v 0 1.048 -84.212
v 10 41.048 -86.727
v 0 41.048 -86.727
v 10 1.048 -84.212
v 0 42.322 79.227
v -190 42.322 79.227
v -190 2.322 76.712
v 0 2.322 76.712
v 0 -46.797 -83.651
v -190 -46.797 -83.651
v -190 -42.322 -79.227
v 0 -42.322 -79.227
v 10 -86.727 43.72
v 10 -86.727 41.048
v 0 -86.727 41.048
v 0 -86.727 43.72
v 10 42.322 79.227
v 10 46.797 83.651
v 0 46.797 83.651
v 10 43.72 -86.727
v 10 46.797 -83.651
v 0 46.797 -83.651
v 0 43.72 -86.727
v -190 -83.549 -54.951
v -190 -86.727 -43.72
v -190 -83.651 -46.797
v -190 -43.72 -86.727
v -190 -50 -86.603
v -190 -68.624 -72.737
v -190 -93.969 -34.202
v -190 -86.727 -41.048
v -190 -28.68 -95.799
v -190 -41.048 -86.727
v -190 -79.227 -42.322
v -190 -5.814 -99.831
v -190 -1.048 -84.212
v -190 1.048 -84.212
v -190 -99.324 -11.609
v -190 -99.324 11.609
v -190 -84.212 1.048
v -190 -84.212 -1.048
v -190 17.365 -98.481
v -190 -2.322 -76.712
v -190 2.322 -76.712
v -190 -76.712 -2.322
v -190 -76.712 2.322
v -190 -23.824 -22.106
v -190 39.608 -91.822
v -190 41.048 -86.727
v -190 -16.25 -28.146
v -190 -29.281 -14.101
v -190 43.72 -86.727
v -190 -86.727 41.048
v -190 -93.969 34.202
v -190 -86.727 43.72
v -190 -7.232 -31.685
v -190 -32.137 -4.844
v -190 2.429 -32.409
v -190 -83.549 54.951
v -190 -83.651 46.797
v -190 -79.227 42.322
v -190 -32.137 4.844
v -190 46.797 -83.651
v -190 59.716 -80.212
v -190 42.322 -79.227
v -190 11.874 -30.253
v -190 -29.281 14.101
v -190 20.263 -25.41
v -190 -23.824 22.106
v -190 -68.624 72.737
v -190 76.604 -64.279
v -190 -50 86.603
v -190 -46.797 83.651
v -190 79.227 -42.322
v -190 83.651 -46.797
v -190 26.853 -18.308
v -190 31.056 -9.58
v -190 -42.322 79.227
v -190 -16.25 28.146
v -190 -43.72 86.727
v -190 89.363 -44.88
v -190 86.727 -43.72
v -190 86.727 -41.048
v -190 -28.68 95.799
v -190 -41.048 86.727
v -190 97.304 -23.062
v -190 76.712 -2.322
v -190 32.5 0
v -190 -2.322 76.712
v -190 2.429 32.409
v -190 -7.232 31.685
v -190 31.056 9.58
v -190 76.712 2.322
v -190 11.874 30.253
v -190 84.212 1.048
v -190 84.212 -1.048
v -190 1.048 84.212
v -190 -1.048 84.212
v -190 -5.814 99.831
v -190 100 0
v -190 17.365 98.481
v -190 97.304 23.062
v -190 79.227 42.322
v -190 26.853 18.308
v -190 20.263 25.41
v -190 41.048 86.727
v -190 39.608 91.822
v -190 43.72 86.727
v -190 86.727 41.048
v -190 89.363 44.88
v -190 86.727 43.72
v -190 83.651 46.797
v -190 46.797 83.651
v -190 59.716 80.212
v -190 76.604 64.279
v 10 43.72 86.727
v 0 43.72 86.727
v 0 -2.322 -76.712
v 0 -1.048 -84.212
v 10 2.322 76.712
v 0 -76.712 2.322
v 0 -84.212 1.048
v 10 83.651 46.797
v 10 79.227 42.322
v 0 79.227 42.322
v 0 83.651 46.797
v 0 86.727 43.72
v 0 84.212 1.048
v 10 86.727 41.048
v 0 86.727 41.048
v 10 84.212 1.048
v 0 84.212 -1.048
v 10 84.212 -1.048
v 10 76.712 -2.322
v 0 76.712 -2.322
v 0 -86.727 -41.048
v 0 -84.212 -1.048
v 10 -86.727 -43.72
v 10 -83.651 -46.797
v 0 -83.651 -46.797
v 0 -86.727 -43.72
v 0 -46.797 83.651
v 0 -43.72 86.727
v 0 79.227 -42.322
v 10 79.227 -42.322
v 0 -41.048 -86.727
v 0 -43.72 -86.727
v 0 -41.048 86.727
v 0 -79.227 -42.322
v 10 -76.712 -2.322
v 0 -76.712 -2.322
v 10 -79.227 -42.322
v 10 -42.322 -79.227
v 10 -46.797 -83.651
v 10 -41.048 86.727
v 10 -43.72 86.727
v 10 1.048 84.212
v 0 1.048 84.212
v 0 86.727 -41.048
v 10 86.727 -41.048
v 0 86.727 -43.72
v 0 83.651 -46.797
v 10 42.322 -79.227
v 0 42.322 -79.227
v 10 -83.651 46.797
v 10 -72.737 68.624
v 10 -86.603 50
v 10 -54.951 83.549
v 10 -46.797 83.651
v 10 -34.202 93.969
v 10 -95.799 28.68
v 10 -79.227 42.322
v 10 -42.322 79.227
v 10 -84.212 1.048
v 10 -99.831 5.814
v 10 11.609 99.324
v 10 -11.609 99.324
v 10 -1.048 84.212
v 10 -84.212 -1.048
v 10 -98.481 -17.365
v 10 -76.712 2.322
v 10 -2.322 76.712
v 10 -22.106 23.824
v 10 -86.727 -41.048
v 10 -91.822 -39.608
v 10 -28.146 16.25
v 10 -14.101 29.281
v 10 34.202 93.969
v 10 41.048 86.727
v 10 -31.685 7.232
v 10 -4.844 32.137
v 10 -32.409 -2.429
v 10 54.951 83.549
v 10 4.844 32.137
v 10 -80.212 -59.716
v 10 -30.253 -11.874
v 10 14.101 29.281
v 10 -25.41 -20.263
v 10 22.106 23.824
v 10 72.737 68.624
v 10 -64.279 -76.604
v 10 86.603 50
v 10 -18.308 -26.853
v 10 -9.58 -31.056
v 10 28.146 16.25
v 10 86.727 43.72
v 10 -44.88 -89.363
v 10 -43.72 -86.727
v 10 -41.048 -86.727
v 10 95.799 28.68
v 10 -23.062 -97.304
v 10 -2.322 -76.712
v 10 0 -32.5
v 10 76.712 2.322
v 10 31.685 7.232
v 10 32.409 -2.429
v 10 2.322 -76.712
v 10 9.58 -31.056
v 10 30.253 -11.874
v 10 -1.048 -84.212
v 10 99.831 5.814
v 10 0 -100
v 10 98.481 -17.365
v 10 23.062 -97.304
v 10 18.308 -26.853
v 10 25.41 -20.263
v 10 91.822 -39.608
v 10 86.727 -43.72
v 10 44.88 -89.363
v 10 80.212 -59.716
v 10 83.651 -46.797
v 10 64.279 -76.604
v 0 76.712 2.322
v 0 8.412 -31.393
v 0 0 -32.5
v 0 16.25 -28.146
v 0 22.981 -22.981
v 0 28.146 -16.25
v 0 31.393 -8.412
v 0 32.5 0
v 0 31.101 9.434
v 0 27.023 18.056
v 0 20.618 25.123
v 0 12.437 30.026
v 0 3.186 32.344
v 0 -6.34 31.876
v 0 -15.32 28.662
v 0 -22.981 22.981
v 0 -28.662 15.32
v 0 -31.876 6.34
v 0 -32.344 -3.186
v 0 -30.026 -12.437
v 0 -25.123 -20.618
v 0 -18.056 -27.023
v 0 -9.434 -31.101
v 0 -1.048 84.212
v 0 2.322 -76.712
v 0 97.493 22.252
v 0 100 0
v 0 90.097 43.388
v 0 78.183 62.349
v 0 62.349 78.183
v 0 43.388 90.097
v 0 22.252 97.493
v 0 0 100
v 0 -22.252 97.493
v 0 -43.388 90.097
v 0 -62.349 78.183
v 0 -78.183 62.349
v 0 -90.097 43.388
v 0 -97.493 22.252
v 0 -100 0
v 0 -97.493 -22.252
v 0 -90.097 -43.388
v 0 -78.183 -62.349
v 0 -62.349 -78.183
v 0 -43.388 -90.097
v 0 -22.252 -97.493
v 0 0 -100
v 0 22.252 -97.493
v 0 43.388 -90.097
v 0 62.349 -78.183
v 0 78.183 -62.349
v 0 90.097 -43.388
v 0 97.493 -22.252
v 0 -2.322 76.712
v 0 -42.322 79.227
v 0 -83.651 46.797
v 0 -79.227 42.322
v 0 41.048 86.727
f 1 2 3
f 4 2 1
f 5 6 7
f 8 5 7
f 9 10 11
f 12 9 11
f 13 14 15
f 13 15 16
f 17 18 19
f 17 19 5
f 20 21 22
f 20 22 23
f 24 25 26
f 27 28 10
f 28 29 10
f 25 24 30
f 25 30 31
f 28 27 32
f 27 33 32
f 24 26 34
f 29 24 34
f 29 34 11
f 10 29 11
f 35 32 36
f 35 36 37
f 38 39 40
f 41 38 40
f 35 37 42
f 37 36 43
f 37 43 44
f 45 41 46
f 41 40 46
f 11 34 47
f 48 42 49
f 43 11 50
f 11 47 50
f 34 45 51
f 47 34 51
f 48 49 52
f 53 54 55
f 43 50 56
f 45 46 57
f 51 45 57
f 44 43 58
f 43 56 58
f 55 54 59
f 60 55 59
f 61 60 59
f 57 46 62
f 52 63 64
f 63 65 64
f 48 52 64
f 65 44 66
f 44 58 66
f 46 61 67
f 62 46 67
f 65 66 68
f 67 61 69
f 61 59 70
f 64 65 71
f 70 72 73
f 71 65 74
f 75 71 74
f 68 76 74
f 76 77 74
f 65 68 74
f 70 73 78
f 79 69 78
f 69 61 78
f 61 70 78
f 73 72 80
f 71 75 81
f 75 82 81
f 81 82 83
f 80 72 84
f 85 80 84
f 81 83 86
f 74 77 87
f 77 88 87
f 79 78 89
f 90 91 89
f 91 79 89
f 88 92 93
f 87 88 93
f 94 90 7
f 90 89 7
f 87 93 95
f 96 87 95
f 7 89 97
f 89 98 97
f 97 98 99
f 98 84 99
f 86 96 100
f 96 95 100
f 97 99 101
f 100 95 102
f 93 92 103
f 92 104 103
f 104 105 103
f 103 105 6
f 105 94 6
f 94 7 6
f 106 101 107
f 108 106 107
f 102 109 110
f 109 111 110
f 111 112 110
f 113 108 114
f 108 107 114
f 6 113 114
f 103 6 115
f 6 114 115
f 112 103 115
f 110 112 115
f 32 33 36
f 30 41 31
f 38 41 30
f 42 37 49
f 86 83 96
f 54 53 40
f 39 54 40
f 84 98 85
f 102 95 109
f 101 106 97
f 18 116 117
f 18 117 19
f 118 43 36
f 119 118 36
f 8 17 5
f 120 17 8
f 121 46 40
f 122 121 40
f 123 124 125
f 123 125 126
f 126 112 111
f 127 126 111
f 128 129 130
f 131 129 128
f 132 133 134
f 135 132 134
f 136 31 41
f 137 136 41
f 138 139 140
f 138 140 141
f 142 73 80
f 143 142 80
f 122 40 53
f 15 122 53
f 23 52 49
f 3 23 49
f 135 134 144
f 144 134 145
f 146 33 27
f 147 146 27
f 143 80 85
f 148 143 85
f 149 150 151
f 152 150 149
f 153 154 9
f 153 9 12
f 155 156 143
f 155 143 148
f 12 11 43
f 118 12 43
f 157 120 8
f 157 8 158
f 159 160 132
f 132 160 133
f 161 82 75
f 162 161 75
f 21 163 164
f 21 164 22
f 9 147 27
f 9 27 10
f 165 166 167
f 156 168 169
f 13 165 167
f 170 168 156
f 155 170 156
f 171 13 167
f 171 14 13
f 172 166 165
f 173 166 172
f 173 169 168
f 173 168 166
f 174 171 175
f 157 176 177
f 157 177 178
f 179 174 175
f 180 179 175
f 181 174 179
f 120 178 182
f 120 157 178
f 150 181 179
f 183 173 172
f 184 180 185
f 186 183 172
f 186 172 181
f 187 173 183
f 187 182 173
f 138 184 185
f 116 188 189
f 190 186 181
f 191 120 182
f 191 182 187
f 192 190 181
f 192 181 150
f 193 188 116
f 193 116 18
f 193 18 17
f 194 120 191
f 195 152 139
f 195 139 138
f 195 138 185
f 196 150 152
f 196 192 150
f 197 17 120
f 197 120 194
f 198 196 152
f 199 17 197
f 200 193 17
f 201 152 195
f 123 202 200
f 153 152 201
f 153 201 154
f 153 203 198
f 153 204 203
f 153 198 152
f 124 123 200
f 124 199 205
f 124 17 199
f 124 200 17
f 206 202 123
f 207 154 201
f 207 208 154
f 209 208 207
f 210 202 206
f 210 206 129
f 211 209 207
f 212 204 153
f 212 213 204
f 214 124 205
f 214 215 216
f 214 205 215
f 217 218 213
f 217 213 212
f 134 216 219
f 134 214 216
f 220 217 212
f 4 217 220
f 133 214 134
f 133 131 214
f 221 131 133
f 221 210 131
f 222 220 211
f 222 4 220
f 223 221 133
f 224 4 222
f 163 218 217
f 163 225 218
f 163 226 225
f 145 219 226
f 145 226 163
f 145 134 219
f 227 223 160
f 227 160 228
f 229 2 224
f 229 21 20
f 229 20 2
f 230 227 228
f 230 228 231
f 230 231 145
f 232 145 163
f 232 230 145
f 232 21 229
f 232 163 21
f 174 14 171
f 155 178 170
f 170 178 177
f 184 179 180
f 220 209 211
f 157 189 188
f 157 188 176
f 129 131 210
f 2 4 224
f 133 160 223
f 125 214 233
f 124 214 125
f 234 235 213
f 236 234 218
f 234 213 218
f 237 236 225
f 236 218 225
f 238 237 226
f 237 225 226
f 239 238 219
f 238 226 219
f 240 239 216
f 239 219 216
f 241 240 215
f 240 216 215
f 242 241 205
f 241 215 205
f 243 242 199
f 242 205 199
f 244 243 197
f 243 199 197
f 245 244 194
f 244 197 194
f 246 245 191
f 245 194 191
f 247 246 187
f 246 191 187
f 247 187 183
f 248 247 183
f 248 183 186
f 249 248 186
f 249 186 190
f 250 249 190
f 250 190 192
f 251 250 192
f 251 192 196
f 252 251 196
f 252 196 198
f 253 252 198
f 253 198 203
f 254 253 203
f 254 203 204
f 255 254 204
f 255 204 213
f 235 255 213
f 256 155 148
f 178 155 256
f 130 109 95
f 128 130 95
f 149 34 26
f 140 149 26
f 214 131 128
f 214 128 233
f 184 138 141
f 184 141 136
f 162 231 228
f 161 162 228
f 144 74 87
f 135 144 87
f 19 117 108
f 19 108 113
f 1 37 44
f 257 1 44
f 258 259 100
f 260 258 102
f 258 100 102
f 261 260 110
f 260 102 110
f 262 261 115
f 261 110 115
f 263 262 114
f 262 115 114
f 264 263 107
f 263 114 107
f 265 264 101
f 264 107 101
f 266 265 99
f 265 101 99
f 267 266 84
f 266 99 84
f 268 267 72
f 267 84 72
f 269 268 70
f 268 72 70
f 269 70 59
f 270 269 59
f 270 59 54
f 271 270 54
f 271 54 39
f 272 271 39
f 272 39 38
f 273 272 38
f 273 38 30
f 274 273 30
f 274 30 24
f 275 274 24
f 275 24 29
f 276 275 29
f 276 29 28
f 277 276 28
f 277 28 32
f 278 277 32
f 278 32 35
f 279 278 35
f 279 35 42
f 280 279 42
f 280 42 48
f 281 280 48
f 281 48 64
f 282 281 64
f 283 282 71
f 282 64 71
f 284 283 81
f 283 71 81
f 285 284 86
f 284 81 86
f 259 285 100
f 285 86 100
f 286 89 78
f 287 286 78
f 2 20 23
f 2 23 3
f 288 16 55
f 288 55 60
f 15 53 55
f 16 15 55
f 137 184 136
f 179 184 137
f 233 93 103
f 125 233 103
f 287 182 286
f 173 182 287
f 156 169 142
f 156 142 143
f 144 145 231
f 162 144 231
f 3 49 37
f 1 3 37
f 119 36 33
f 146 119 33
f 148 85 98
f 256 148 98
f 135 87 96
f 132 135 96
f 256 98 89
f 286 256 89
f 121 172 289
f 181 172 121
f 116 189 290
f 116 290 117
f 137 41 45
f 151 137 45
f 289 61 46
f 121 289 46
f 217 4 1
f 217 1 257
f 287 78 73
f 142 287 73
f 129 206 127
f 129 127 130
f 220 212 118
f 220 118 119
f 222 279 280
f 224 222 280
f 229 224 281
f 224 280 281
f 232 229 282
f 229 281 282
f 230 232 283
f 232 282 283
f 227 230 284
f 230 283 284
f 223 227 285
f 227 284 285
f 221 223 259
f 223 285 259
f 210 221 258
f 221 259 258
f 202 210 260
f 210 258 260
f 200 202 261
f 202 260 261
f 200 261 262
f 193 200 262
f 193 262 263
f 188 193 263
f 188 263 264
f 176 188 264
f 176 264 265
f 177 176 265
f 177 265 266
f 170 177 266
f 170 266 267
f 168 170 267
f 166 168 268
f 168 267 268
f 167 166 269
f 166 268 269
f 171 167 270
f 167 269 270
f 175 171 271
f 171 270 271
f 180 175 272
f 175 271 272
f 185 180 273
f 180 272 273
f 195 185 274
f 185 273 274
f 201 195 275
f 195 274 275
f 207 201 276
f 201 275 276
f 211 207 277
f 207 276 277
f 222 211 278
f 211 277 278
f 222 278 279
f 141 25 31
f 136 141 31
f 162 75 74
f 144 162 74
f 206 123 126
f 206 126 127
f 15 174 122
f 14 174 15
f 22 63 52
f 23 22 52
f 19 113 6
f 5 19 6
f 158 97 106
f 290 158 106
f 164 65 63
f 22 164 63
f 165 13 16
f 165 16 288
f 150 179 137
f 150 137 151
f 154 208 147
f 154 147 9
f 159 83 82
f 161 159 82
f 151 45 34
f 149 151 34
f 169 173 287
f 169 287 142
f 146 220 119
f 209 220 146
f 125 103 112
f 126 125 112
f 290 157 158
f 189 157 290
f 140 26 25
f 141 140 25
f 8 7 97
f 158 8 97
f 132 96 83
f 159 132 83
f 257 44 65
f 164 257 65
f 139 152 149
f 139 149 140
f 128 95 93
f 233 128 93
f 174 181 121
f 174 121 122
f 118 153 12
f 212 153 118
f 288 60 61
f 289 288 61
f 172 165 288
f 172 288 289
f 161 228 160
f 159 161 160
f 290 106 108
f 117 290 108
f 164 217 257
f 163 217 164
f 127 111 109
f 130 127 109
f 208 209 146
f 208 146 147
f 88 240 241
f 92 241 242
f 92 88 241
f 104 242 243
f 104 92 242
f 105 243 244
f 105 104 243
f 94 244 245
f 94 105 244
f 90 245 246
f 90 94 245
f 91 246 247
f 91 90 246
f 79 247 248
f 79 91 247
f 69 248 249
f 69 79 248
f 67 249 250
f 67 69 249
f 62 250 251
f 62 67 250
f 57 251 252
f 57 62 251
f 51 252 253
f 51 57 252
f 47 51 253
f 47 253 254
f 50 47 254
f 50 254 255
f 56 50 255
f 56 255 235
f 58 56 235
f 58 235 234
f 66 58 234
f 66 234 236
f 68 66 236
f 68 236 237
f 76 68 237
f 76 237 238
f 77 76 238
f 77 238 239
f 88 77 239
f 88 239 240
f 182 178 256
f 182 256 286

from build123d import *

# Parameters (mm, degrees)
SKETCH1_R           = 100
BOSS_EXTRUDE1_DEPTH = 10
SKETCH2_R           = 32.5
CUT_EXTRUDE1_DEPTH  = 250
LPATTERN5_COUNT     = 20
LPATTERN5_PITCH     = 10


with BuildPart() as part:
    # Sketch1 → Boss-Extrude1 (new body)
    with BuildSketch(Plane(origin=(0, 0, 0), x_dir=(0, 0, -1), z_dir=(1, 0, 0))):
        Circle(SKETCH1_R)
    boss_extrude1 = extrude(amount=BOSS_EXTRUDE1_DEPTH)

    # Sketch2 → Cut-Extrude1 (cut)
    with BuildSketch(Plane(origin=(10, 0, 0), x_dir=(0, 0, -1), z_dir=(1, 0, 0))):
        Circle(SKETCH2_R)
        Polygon((1.047809143, 84.212465352), (2.321864858, 76.712465352), (42.321864858, 79.227207296), (46.796605305, 83.651032908), (43.720430917, 86.727207296), (41.047809143, 86.727207296), align=None)
        Polygon((-1.047809143, 84.212465352), (-2.321864858, 76.712465352), (-42.321864858, 79.227207296), (-46.796605305, 83.651032908), (-43.720430917, 86.727207296), (-41.047809143, 86.727207296), align=None)
        Polygon((84.212465352, 1.047809143), (76.712465352, 2.321864858), (79.227207296, 42.321864858), (83.651032908, 46.796605305), (86.727207296, 43.720430917), (86.727207296, 41.047809143), align=None)
        Polygon((84.212465352, -1.047809143), (86.727207296, -41.047809143), (86.727207296, -43.720430917), (83.651032908, -46.796605305), (79.227207296, -42.321864858), (76.712465352, -2.321864858), align=None)
        Polygon((1.047809143, -84.212465352), (2.321864858, -76.712465352), (42.321864858, -79.227207296), (46.796605305, -83.651032908), (43.720430917, -86.727207296), (41.047809143, -86.727207296), align=None)
        Polygon((-1.047809143, -84.212465352), (-41.047809143, -86.727207296), (-43.720430917, -86.727207296), (-46.796605305, -83.651032908), (-42.321864858, -79.227207296), (-2.321864858, -76.712465352), align=None)
        Polygon((-84.212465352, -1.047809143), (-76.712465352, -2.321864858), (-79.227207296, -42.321864858), (-83.651032908, -46.796605305), (-86.727207296, -43.720430917), (-86.727207296, -41.047809143), align=None)
        Polygon((-84.212465352, 1.047809143), (-86.727207296, 41.047809143), (-86.727207296, 43.720430917), (-83.651032908, 46.796605305), (-79.227207296, 42.321864858), (-76.712465352, 2.321864858), align=None)
    cut_extrude1 = extrude(amount=-CUT_EXTRUDE1_DEPTH, mode=Mode.SUBTRACT)

    # LPattern5: Boss-Extrude1, Cut-Extrude1 ×20
    with Locations(*[(-i * LPATTERN5_PITCH, 0, 0) for i in range(1, LPATTERN5_COUNT)]):
        add(boss_extrude1)
        add(cut_extrude1, mode=Mode.SUBTRACT)


solid = part.part
